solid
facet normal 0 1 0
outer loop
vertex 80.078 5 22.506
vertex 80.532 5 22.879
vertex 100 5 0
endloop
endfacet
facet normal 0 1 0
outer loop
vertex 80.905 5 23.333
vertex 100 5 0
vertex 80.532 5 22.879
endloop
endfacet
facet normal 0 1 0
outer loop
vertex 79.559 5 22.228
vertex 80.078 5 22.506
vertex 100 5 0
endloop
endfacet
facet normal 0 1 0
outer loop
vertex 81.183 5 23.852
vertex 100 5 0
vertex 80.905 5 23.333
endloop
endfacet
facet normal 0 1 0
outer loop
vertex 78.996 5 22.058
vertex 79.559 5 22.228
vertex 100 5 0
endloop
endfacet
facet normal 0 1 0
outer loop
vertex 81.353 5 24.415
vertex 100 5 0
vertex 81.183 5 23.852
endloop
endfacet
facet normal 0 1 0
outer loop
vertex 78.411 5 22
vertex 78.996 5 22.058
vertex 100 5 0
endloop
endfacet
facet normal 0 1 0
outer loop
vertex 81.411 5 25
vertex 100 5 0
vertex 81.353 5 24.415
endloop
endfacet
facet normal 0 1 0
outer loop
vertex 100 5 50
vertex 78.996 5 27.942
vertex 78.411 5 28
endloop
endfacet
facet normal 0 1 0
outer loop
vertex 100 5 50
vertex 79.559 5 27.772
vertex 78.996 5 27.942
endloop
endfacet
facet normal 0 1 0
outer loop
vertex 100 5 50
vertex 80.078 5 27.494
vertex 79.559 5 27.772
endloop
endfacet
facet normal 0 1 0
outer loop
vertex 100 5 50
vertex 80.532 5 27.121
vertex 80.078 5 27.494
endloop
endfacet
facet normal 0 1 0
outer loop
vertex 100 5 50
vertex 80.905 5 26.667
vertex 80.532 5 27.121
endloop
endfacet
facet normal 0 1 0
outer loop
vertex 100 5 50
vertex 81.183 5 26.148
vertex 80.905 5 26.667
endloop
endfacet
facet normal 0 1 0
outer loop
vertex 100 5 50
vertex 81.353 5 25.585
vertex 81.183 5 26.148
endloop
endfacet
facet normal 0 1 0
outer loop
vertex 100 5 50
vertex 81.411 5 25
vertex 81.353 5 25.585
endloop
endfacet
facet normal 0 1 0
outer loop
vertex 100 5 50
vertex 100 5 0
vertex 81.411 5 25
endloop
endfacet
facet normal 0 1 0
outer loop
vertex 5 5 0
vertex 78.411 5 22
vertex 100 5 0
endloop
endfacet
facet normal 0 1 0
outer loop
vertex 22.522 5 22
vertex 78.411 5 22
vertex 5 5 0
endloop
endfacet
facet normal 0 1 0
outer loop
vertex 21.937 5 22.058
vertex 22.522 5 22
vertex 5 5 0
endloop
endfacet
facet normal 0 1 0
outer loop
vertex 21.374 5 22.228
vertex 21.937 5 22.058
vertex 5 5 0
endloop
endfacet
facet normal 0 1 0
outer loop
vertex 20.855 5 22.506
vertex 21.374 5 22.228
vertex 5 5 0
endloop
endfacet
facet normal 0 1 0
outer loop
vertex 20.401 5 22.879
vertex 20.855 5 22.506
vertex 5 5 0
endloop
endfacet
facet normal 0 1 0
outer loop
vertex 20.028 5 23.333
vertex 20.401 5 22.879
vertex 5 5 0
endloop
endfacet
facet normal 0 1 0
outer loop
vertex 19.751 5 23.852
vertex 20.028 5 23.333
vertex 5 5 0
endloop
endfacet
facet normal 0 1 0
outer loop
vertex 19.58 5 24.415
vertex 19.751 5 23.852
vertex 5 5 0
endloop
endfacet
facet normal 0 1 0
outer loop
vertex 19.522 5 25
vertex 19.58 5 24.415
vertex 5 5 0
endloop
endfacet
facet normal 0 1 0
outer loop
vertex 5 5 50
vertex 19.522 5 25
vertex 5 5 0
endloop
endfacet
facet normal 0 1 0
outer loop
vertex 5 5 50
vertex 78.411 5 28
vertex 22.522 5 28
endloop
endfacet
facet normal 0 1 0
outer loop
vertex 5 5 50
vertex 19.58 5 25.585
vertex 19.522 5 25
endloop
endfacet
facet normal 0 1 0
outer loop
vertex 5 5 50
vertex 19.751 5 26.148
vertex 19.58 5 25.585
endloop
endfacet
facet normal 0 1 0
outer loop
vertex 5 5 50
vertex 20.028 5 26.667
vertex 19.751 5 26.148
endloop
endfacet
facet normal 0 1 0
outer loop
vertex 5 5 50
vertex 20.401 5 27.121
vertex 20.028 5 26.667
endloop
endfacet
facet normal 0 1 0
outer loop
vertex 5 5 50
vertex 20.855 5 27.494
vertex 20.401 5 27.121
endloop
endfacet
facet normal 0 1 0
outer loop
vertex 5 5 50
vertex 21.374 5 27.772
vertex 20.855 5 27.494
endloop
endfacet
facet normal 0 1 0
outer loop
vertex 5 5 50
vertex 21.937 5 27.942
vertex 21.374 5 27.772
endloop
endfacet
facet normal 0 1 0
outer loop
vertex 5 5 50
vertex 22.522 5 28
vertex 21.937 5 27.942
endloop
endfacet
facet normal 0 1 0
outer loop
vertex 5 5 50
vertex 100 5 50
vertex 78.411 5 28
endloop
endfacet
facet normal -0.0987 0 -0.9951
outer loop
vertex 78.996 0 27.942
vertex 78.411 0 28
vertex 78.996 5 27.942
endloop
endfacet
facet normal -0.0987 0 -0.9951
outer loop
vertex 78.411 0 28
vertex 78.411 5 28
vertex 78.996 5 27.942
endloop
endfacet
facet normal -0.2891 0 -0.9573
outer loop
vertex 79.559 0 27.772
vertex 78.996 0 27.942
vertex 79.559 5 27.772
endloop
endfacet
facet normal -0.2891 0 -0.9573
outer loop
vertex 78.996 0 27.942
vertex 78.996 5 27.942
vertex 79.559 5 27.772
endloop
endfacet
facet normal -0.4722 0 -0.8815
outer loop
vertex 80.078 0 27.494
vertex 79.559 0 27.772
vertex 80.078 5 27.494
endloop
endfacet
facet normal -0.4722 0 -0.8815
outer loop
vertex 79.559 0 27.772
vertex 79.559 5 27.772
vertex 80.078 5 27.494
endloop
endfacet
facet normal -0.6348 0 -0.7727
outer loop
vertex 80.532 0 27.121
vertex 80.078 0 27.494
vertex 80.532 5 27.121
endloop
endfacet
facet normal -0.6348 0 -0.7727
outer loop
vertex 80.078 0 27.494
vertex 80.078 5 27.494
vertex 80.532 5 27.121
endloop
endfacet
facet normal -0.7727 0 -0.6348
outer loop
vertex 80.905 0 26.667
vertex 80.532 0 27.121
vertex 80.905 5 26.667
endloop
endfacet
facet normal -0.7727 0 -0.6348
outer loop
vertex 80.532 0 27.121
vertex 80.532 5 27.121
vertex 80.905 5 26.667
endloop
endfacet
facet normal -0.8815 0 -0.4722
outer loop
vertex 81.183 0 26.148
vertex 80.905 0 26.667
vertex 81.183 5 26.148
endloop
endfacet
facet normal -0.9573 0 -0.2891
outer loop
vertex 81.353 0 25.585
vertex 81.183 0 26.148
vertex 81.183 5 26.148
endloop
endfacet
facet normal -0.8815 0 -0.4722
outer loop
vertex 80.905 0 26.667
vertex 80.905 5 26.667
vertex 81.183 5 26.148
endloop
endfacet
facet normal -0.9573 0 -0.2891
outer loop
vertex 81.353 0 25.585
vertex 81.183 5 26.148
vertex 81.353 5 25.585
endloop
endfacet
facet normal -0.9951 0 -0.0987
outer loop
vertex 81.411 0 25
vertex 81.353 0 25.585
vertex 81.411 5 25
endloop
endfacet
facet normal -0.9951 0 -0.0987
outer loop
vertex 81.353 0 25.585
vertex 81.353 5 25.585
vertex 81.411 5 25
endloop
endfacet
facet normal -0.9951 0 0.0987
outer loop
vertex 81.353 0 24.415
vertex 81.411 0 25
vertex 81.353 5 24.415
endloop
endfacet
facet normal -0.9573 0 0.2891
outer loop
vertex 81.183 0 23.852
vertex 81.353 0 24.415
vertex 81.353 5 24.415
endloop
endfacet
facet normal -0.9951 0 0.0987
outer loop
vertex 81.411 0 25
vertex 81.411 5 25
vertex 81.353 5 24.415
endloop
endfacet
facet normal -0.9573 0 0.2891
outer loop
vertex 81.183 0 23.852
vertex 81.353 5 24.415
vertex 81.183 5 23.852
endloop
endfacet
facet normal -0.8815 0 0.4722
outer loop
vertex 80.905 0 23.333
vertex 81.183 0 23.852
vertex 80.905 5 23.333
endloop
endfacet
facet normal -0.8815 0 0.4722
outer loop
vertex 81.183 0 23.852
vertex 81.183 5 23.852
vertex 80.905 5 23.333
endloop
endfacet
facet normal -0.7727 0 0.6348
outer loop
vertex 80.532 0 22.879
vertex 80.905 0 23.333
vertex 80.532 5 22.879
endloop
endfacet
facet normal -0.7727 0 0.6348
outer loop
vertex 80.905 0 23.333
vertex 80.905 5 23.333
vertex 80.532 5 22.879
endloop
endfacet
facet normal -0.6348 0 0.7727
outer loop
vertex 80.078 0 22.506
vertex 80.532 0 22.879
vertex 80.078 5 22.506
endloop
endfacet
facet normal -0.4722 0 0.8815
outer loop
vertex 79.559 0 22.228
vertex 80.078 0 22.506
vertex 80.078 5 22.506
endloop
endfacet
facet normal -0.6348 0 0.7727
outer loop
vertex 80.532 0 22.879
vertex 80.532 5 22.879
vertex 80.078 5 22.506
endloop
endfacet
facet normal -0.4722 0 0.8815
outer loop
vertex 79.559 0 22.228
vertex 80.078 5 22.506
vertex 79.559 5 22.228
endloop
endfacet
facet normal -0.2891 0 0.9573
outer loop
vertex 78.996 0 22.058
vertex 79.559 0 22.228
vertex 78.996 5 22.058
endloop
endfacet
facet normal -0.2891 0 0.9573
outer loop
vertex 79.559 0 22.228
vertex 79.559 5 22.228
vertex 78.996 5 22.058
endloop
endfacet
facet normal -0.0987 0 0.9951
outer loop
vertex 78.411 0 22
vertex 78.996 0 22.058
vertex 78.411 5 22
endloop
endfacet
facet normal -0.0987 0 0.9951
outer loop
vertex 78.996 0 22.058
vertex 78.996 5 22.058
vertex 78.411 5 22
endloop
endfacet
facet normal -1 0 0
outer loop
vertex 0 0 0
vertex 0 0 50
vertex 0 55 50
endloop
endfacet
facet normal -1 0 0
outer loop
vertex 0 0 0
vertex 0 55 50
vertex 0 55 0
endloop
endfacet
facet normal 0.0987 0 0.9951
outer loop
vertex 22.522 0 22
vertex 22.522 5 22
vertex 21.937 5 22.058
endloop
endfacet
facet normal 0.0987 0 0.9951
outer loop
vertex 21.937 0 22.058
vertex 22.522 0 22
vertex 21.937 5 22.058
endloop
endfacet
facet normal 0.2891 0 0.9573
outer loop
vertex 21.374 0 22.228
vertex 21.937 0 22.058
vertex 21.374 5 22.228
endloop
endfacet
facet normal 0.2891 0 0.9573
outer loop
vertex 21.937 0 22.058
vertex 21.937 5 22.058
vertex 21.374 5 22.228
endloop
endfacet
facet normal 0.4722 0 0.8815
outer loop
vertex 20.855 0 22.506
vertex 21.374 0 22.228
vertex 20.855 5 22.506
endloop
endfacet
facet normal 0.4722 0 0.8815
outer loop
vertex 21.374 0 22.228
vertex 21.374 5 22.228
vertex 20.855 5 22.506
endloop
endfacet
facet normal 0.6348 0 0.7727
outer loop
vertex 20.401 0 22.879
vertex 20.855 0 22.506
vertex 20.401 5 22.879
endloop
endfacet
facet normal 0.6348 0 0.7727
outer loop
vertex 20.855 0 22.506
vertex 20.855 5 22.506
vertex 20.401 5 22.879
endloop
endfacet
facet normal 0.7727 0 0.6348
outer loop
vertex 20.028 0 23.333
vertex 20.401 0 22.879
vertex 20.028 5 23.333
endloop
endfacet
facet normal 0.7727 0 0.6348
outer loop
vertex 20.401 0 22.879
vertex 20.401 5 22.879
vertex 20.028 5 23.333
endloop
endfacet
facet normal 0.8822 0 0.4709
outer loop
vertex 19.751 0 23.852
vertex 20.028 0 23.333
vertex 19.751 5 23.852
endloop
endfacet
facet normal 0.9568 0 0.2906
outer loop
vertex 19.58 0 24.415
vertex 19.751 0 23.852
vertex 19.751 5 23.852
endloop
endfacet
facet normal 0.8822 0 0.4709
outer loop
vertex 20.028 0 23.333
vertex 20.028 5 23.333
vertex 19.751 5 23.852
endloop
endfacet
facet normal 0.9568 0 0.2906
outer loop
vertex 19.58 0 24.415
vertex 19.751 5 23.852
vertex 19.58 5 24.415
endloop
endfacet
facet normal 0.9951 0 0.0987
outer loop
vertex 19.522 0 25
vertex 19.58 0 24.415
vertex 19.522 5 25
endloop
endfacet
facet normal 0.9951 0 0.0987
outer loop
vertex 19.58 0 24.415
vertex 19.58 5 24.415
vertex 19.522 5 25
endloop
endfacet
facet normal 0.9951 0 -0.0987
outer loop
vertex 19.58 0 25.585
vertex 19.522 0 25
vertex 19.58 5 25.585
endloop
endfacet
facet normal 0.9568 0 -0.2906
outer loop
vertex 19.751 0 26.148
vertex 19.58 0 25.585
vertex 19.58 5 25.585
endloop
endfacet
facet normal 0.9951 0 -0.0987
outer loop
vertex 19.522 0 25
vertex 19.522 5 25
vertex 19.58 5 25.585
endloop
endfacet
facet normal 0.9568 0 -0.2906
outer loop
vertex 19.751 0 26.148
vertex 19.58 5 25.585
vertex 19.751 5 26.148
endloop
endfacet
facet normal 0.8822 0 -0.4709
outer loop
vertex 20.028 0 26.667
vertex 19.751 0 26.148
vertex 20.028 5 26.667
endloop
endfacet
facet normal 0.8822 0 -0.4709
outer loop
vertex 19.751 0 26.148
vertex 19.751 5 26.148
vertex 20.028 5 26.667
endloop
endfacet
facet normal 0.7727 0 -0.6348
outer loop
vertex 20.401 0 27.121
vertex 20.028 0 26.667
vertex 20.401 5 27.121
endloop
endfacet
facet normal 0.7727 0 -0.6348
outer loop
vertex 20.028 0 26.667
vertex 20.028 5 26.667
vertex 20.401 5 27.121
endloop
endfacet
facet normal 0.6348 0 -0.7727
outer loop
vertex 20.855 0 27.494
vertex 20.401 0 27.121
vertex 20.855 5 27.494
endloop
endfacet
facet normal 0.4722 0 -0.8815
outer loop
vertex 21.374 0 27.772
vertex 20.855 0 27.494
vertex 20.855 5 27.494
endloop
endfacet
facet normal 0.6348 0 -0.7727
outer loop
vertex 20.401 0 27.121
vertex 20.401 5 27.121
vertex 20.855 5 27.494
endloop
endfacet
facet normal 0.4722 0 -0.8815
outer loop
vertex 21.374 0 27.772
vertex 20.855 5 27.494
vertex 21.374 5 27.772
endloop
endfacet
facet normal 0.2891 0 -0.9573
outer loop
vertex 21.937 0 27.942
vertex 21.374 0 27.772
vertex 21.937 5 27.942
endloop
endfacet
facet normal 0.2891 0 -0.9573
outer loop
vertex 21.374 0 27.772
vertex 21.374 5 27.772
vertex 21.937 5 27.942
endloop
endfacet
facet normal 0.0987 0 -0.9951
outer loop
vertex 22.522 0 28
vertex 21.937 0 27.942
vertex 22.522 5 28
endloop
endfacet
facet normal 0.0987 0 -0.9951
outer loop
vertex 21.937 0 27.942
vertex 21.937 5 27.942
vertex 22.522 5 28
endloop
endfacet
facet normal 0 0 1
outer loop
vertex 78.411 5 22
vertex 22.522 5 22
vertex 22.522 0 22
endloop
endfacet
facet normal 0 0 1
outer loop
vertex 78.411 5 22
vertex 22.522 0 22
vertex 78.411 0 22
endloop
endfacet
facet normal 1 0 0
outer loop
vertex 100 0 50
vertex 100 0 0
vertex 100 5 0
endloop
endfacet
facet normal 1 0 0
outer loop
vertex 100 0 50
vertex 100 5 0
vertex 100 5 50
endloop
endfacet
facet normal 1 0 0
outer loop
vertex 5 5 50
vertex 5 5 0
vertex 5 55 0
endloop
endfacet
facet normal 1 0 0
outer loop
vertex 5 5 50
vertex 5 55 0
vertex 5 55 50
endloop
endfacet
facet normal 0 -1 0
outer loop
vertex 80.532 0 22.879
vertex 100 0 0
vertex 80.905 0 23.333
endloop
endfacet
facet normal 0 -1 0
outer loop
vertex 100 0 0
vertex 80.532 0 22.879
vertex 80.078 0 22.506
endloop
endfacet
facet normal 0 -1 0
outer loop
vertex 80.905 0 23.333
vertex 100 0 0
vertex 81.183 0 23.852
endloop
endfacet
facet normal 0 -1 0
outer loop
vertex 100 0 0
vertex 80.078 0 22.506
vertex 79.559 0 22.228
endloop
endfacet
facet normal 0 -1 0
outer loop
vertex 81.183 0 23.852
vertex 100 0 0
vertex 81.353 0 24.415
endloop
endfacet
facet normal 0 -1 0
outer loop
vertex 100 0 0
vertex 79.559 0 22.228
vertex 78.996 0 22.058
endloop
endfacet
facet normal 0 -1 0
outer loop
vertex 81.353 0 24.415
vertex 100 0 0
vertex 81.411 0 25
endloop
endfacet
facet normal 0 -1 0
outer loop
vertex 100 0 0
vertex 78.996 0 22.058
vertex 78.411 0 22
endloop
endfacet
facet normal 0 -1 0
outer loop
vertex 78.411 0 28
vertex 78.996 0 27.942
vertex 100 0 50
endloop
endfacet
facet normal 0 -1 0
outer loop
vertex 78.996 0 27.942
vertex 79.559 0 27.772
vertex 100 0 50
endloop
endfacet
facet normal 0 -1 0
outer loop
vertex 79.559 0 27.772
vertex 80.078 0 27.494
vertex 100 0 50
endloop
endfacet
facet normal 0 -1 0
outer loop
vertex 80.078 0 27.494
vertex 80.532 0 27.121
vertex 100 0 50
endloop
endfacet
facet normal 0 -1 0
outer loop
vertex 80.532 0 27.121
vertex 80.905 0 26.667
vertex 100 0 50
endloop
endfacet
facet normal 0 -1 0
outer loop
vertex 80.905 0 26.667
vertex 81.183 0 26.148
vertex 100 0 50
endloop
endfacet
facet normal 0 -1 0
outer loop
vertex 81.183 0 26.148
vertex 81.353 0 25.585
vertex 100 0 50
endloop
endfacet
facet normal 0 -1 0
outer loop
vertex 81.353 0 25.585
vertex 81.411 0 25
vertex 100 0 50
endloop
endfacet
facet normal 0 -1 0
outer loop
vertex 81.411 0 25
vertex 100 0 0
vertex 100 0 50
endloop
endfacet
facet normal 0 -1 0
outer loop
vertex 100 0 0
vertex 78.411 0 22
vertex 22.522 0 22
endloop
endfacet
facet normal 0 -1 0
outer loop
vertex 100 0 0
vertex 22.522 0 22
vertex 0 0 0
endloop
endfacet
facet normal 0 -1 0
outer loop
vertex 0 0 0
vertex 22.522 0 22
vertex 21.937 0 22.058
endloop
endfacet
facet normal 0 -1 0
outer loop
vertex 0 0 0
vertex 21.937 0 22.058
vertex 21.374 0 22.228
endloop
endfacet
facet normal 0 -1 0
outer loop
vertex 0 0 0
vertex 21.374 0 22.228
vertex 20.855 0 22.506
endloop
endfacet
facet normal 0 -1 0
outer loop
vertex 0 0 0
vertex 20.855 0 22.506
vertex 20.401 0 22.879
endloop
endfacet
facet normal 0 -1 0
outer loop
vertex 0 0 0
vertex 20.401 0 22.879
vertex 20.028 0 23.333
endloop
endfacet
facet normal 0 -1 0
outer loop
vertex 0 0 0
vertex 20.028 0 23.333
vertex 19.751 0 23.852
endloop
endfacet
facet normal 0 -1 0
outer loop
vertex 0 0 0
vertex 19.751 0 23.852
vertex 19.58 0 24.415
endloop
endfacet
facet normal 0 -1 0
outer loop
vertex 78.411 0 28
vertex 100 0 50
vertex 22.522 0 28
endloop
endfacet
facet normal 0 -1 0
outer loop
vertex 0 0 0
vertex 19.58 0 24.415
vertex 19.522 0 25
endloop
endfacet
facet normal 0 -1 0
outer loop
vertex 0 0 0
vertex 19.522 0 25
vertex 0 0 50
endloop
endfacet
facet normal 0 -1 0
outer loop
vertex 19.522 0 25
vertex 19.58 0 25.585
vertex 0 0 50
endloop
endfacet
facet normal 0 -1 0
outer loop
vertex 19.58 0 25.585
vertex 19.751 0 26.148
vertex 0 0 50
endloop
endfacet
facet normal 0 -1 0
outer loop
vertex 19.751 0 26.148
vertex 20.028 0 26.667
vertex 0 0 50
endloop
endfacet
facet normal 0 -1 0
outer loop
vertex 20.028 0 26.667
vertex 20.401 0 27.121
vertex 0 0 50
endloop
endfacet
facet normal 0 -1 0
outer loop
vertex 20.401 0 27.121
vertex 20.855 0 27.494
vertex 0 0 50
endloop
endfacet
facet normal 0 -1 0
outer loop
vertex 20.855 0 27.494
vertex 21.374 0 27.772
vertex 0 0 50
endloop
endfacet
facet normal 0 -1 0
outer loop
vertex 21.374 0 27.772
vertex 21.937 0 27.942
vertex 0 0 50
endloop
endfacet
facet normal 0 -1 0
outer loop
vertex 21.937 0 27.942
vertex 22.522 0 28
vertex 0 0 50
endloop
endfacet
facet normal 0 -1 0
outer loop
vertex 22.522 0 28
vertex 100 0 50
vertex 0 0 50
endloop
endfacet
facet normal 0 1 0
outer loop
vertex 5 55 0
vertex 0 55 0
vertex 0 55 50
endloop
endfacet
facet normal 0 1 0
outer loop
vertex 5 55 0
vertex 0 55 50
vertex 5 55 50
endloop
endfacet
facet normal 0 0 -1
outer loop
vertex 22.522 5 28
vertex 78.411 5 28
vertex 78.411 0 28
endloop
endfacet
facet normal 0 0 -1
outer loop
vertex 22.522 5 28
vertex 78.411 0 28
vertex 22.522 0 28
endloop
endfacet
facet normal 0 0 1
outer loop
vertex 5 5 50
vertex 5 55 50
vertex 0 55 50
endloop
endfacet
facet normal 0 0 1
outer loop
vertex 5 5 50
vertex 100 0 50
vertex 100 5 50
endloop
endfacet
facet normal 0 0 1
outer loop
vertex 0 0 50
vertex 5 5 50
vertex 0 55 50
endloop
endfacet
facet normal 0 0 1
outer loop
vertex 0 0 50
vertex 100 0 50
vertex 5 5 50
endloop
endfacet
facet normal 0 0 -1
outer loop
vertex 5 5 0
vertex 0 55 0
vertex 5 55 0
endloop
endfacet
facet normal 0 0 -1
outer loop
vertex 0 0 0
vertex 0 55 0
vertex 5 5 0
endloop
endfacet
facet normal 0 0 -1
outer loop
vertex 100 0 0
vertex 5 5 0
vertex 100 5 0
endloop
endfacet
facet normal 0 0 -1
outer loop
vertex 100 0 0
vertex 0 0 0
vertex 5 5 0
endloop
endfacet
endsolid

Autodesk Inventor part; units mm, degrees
ref_plane "YZ Plane" through (0, 0, 0) normal (1, 0, 0) x (0, 1, 0)
ref_plane "XZ Plane" through (0, 0, 0) normal (0, 1, 0) x (-1, 0, 0)
ref_plane "XY Plane" through (0, 0, 0) normal (0, 0, 1) x (1, 0, 0)
sketch "Sketch1" plane through (0, 0, 0) normal (0, 1, 0) x (-1, 0, 0)
  line L0 (0, 0) -> (-100, 0)
  line L1 (-100, 0) -> (-100, 50)
  line L2 (-100, 50) -> (0, 50)
  line L3 (0, 50) -> (0, 0)
  dimension "d0" = 100
  dimension "d1" = 50
extrude "Extrusion1" add sketch "Sketch1" along normal blind 5
sketch "Sketch3" plane through (0, 5, 0) normal (0, 1, 0) x (1, 0, 0)
  line L0 (0, -50) -> (100, -50) projected
  line L1 (0, 0) -> (5, 0)
  line L2 (5, 0) -> (5, -50)
  line L3 (5, -50) -> (0, -50)
  line L4 (0, -50) -> (0, 0)
  dimension "d14" = 5
extrude "Extrusion2" add sketch "Sketch3" along normal blind 50
sketch "Sketch4" plane through (0, 5, 0) normal (0, 1, 0) x (1, 0, 0)
  line L0 (5, 0) -> (5, -50) projected
  line L1 (5, -50) -> (100, -50) construction
  line L2 (100, -50) -> (100, 0) construction
  line L3 (100, 0) -> (5, 0) construction
  arc A0 (78.411, -28) -> (78.411, -22) centre (78.411, -25) ccw
  arc A1 (22.5222, -22) -> (22.5222, -28) centre (22.5222, -25) ccw
  line L4 (22.5222, -22) -> (78.411, -22)
  line L5 (78.411, -28) -> (22.5222, -28)
  point P0 (0, 0)
  point P1 (100, -25)
  dimension "d30" = 6
  dimension "d31" = 6
  dimension "d32" = 25
extrude "Extrusion3" cut sketch "Sketch4" against normal up to surface (5 mm away)
properties part number "Horonyrogzito_b"
